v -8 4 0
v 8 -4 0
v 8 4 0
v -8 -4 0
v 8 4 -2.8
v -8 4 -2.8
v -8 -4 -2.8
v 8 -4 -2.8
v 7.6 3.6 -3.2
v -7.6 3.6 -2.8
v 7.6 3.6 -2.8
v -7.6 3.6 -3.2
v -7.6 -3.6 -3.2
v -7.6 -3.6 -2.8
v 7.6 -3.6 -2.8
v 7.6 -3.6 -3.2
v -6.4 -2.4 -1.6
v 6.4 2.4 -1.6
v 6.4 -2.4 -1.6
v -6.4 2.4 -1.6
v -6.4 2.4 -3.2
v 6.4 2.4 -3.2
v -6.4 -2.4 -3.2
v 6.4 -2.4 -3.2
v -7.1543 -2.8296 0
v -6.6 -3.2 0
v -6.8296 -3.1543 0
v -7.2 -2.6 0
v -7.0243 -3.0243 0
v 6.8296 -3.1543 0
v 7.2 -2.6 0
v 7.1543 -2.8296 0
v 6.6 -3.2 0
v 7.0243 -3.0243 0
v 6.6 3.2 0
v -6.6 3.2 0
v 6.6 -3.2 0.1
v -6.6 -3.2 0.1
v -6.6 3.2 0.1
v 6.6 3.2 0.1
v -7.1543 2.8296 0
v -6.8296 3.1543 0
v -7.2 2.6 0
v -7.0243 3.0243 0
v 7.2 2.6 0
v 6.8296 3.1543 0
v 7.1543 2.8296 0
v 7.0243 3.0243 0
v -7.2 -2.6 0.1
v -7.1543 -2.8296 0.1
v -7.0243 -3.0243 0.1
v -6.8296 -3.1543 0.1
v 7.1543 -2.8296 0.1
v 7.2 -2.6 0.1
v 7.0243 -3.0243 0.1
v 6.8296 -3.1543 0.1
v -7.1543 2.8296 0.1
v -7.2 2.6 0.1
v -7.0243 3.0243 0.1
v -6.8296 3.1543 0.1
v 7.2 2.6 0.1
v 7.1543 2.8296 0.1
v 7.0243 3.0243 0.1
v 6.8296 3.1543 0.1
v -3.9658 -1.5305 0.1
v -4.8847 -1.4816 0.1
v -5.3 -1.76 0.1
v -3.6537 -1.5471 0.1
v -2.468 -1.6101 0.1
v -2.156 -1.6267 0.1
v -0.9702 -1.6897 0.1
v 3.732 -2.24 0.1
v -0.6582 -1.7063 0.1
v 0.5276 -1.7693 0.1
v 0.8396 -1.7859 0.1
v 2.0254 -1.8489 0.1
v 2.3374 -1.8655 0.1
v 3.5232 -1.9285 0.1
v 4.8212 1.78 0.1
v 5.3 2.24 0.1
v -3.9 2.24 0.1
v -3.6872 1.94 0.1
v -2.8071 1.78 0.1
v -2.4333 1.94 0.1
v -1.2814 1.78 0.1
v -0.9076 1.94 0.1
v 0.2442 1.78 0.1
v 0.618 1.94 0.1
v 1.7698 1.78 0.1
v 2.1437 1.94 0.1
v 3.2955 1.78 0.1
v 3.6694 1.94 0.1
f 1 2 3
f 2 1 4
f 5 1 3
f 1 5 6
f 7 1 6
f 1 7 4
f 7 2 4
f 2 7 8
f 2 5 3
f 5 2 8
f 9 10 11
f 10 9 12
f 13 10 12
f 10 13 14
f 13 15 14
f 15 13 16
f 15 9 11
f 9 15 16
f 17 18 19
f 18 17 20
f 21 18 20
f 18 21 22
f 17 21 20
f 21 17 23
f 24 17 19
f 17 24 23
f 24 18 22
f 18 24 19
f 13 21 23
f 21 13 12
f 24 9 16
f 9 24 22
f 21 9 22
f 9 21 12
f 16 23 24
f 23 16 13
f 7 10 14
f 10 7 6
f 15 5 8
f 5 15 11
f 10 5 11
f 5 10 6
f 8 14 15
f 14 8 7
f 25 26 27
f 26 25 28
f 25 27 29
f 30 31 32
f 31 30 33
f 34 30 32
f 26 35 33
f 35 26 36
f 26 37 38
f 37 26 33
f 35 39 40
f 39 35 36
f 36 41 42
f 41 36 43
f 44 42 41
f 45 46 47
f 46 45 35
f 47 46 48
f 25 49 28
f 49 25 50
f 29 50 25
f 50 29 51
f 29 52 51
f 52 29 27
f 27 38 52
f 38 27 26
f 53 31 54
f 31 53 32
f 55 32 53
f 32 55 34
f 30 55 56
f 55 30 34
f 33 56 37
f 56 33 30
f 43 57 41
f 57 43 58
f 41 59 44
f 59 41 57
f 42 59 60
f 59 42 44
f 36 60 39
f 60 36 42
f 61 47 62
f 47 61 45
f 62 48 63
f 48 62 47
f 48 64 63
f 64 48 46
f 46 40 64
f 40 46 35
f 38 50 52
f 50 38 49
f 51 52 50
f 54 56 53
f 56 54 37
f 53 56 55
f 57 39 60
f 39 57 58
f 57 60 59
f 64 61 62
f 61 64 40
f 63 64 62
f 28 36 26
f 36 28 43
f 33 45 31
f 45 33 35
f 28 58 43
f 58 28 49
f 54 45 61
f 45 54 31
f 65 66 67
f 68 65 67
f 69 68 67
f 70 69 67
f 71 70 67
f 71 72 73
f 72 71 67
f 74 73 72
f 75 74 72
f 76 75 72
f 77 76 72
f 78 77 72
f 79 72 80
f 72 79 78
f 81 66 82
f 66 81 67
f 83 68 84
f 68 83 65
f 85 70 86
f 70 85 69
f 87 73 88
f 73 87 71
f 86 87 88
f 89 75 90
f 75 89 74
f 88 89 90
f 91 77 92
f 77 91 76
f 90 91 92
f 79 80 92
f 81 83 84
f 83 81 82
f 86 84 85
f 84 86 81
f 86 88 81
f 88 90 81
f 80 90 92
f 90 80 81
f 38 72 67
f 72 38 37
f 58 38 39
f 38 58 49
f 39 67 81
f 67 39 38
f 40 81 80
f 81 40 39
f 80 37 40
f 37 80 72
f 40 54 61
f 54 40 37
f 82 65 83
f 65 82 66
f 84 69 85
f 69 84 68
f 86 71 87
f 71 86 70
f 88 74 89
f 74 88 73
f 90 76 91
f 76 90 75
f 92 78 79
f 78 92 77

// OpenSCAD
// file: ../p/box3u12.scad
use <../lib.scad>
function ldraw_lib__box3u12() = [
// 0 Box with 3 Parallel Faces without Any Edges
// 0 Name: box3u12.dat
// 0 Author: J.C. Tchang [tchang]
// 0 !LDRAW_ORG Primitive UPDATE 2014-02
// 0 !LICENSE Licensed under CC BY 4.0 : see CAreadme.txt
// 
// 0 BFC CERTIFY CCW
  [0,"BFC","CERTIFY"],
  [0,"BFC","CCW"],
// 
// 0 !HISTORY 2014-12-23 [PTadmin] Official Update 2014-02
// 
// 
// 4 16 -1 1 1 1 1 1 1 1 -1 -1 1 -1
  [4,16,-1,1,1,1,1,1,1,1,-1,-1,1,-1],
// 4 16 -1 1 1 -1 0 1 1 0 1 1 1 1
  [4,16,-1,1,1,-1,0,1,1,0,1,1,1,1],
// 4 16 1 1 -1 1 0 -1 -1 0 -1 -1 1 -1
  [4,16,1,1,-1,1,0,-1,-1,0,-1,-1,1,-1],
];
module ldraw_lib__box3u12(step=0, col=false, unit=2/5, alt=false, line=0.2, solid=!$preview)
    makepoly(ldraw_lib__box3u12(), step=step, col=col, unit=unit, alt=alt, line=line, solid=solid);
ldraw_lib__box3u12(line=0.2);
// file: ../p/1-4cyli.scad
use <../lib.scad>
function ldraw_lib__1_4cyli() = [
// 0 Cylinder 0.25
// 0 Name: 1-4cyli.dat
// 0 Author: James Jessiman
// 0 !LDRAW_ORG Primitive UPDATE 2012-01
// 0 !LICENSE Licensed under CC BY 4.0 : see CAreadme.txt
// 
// 0 BFC CERTIFY CCW
  [0,"BFC","CERTIFY"],
  [0,"BFC","CCW"],
// 
// 0 !HISTORY 2002-03-23 [sbliss] Added BFC statement.
// 0 !HISTORY 2002-04-25 [PTadmin] Official Update 2002-02
// 0 !HISTORY 2007-06-22 [PTadmin] Header formatted for Contributor Agreement
// 0 !HISTORY 2008-07-01 [PTadmin] Official Update 2008-01
// 0 !HISTORY 2012-02-16 [Philo] Changed to CCW
// 0 !HISTORY 2012-03-30 [PTadmin] Official Update 2012-01
// 
// 
// 4 16 1 1 0 0.9239 1 0.3827 0.9239 0 0.3827 1 0 0
  [4,16,1,1,0,0.9239,1,0.3827,0.9239,0,0.3827,1,0,0],
// 5 24 1 0 0 1 1 0 0.9239 0 0.3827 1 0 -1
  [5,24,1,0,0,1,1,0,0.9239,0,0.3827,1,0,-1],
// 4 16 0.9239 1 0.3827 0.7071 1 0.7071 0.7071 0 0.7071 0.9239 0 0.3827
  [4,16,0.9239,1,0.3827,0.7071,1,0.7071,0.7071,0,0.7071,0.9239,0,0.3827],
// 5 24 0.9239 0 0.3827 0.9239 1 0.3827 0.7071 0 0.7071 1 0 0
  [5,24,0.9239,0,0.3827,0.9239,1,0.3827,0.7071,0,0.7071,1,0,0],
// 4 16 0.7071 1 0.7071 0.3827 1 0.9239 0.3827 0 0.9239 0.7071 0 0.7071
  [4,16,0.7071,1,0.7071,0.3827,1,0.9239,0.3827,0,0.9239,0.7071,0,0.7071],
// 5 24 0.7071 0 0.7071 0.7071 1 0.7071 0.3827 0 0.9239 0.9239 0 0.3827
  [5,24,0.7071,0,0.7071,0.7071,1,0.7071,0.3827,0,0.9239,0.9239,0,0.3827],
// 4 16 0.3827 1 0.9239 0 1 1 0 0 1 0.3827 0 0.9239
  [4,16,0.3827,1,0.9239,0,1,1,0,0,1,0.3827,0,0.9239],
// 5 24 0.3827 0 0.9239 0.3827 1 0.9239 0 0 1 0.7071 0 0.7071
  [5,24,0.3827,0,0.9239,0.3827,1,0.9239,0,0,1,0.7071,0,0.7071],
// 5 24 0 0 1 0 1 1 0.3827 0 0.9239 -1 0 1
  [5,24,0,0,1,0,1,1,0.3827,0,0.9239,-1,0,1],
];
module ldraw_lib__1_4cyli(step=0, col=false, unit=2/5, alt=false, line=0.2, solid=!$preview)
    makepoly(ldraw_lib__1_4cyli(), step=step, col=col, unit=unit, alt=alt, line=line, solid=solid);
ldraw_lib__1_4cyli(line=0.2);
// file: ../p/1-4chrd.scad
use <../lib.scad>
function ldraw_lib__1_4chrd() = [
// 0 Chord 0.25
// 0 Name: 1-4chrd.dat
// 0 Author: Max Martin Richter [MMR1988]
// 0 !LDRAW_ORG Primitive UPDATE 2023-05
// 0 !LICENSE Licensed under CC BY 4.0 : see CAreadme.txt
// 
// 0 BFC CERTIFY CCW
  [0,"BFC","CERTIFY"],
  [0,"BFC","CCW"],
// 
// 0 !HISTORY 2004-04-22 [PTadmin] Official Update 2004-02
// 0 !HISTORY 2007-10-09 [PTadmin] Header formatted for Contributor Agreement
// 0 !HISTORY 2008-07-01 [PTadmin] Official Update 2008-01
// 0 !HISTORY 2012-08-02 [MMR1988] Re-creation with PrimGen2 and Rectifier
// 0 !HISTORY 2012-08-09 [PTadmin] Official Update 2012-02
// 0 !HISTORY 2023-10-27 [OrionP] Change author to MMR1988 from hafhead
// 0 !HISTORY 2023-10-31 [OrionP] Official Update 2023-05
// 
// 4 16 0.9239 0 0.3827 0.3827 0 0.9239 0 0 1 1 0 0
  [4,16,0.9239,0,0.3827,0.3827,0,0.9239,0,0,1,1,0,0],
// 3 16 0.7071 0 0.7071 0.3827 0 0.9239 0.9239 0 0.3827
  [3,16,0.7071,0,0.7071,0.3827,0,0.9239,0.9239,0,0.3827],
];
module ldraw_lib__1_4chrd(step=0, col=false, unit=2/5, alt=false, line=0.2, solid=!$preview)
    makepoly(ldraw_lib__1_4chrd(), step=step, col=col, unit=unit, alt=alt, line=line, solid=solid);
ldraw_lib__1_4chrd(line=0.2);
// file: ../p/box5.scad
use <../lib.scad>
function ldraw_lib__box5() = [
// 0 Box with 5 Faces and All Edges
// 0 Name: box5.dat
// 0 Author: James Jessiman
// 0 !LDRAW_ORG Primitive UPDATE 2012-01
// 0 !LICENSE Licensed under CC BY 4.0 : see CAreadme.txt
// 
// 0 BFC CERTIFY CCW
  [0,"BFC","CERTIFY"],
  [0,"BFC","CCW"],
// 
// 0 !HISTORY 2002-04-03 [sbliss] Modified for BFC compliance
// 0 !HISTORY 2002-04-25 [PTadmin] Official Update 2002-02
// 0 !HISTORY 2007-06-24 [PTadmin] Header formatted for Contributor Agreement
// 0 !HISTORY 2008-07-01 [PTadmin] Official Update 2008-01
// 0 !HISTORY 2012-02-16 [Philo] Changed to CCW
// 0 !HISTORY 2012-03-30 [PTadmin] Official Update 2012-01
// 
// 
// 2 24 1 1 1 -1 1 1
  [2,24,1,1,1,-1,1,1],
// 2 24 -1 1 1 -1 1 -1
  [2,24,-1,1,1,-1,1,-1],
// 2 24 -1 1 -1 1 1 -1
  [2,24,-1,1,-1,1,1,-1],
// 2 24 1 1 -1 1 1 1
  [2,24,1,1,-1,1,1,1],
// 2 24 1 0 1 -1 0 1
  [2,24,1,0,1,-1,0,1],
// 2 24 -1 0 1 -1 0 -1
  [2,24,-1,0,1,-1,0,-1],
// 2 24 -1 0 -1 1 0 -1
  [2,24,-1,0,-1,1,0,-1],
// 2 24 1 0 -1 1 0 1
  [2,24,1,0,-1,1,0,1],
// 2 24 1 0 1 1 1 1
  [2,24,1,0,1,1,1,1],
// 2 24 -1 0 1 -1 1 1
  [2,24,-1,0,1,-1,1,1],
// 2 24 1 0 -1 1 1 -1
  [2,24,1,0,-1,1,1,-1],
// 2 24 -1 0 -1 -1 1 -1
  [2,24,-1,0,-1,-1,1,-1],
// 4 16 -1 1 1 1 1 1 1 1 -1 -1 1 -1
  [4,16,-1,1,1,1,1,1,1,1,-1,-1,1,-1],
// 4 16 -1 1 1 -1 0 1 1 0 1 1 1 1
  [4,16,-1,1,1,-1,0,1,1,0,1,1,1,1],
// 4 16 -1 1 -1 -1 0 -1 -1 0 1 -1 1 1
  [4,16,-1,1,-1,-1,0,-1,-1,0,1,-1,1,1],
// 4 16 1 1 -1 1 0 -1 -1 0 -1 -1 1 -1
  [4,16,1,1,-1,1,0,-1,-1,0,-1,-1,1,-1],
// 4 16 1 1 1 1 0 1 1 0 -1 1 1 -1
  [4,16,1,1,1,1,0,1,1,0,-1,1,1,-1],
];
module ldraw_lib__box5(step=0, col=false, unit=2/5, alt=false, line=0.2, solid=!$preview)
    makepoly(ldraw_lib__box5(), step=step, col=col, unit=unit, alt=alt, line=line, solid=solid);
ldraw_lib__box5(line=0.2);
// file: ../p/box4.scad
use <../lib.scad>
function ldraw_lib__box4() = [
// 0 Box with 4 Faces (2 Parallel Pairs) and All Edges
// 0 Name: box4.dat
// 0 Author: James Jessiman
// 0 !LDRAW_ORG Primitive UPDATE 2012-01
// 0 !LICENSE Licensed under CC BY 4.0 : see CAreadme.txt
// 
// 0 BFC CERTIFY CCW
  [0,"BFC","CERTIFY"],
  [0,"BFC","CCW"],
// 
// 0 !HISTORY 2002-04-03 [sbliss] Modified for BFC compliance
// 0 !HISTORY 2002-04-25 [PTadmin] Official Update 2002-02
// 0 !HISTORY 2007-06-24 [PTadmin] Header formatted for Contributor Agreement
// 0 !HISTORY 2008-07-01 [PTadmin] Official Update 2008-01
// 0 !HISTORY 2012-02-16 [Philo] Changed to CCW
// 0 !HISTORY 2012-03-30 [PTadmin] Official Update 2012-01
// 
// 
// 2 24 1 1 1 -1 1 1
  [2,24,1,1,1,-1,1,1],
// 2 24 -1 1 1 -1 1 -1
  [2,24,-1,1,1,-1,1,-1],
// 2 24 -1 1 -1 1 1 -1
  [2,24,-1,1,-1,1,1,-1],
// 2 24 1 1 -1 1 1 1
  [2,24,1,1,-1,1,1,1],
// 2 24 1 0 1 -1 0 1
  [2,24,1,0,1,-1,0,1],
// 2 24 -1 0 1 -1 0 -1
  [2,24,-1,0,1,-1,0,-1],
// 2 24 -1 0 -1 1 0 -1
  [2,24,-1,0,-1,1,0,-1],
// 2 24 1 0 -1 1 0 1
  [2,24,1,0,-1,1,0,1],
// 2 24 1 0 1 1 1 1
  [2,24,1,0,1,1,1,1],
// 2 24 -1 0 1 -1 1 1
  [2,24,-1,0,1,-1,1,1],
// 2 24 1 0 -1 1 1 -1
  [2,24,1,0,-1,1,1,-1],
// 2 24 -1 0 -1 -1 1 -1
  [2,24,-1,0,-1,-1,1,-1],
// 4 16 -1 1 1 -1 0 1 1 0 1 1 1 1
  [4,16,-1,1,1,-1,0,1,1,0,1,1,1,1],
// 4 16 -1 1 -1 -1 0 -1 -1 0 1 -1 1 1
  [4,16,-1,1,-1,-1,0,-1,-1,0,1,-1,1,1],
// 4 16 1 1 -1 1 0 -1 -1 0 -1 -1 1 -1
  [4,16,1,1,-1,1,0,-1,-1,0,-1,-1,1,-1],
// 4 16 1 1 1 1 0 1 1 0 -1 1 1 -1
  [4,16,1,1,1,1,0,1,1,0,-1,1,1,-1],
];
module ldraw_lib__box4(step=0, col=false, unit=2/5, alt=false, line=0.2, solid=!$preview)
    makepoly(ldraw_lib__box4(), step=step, col=col, unit=unit, alt=alt, line=line, solid=solid);
ldraw_lib__box4(line=0.2);
// file: s/3069bs01.scad
use <../../lib.scad>
use <../../p/box4.scad>
use <../../p/box5.scad>
function ldraw_lib__s__3069bs01() = [
// 0 ~Tile  1 x  2 with Groove without Top Face
// 0 Name: s\3069bs01.dat
// 0 Author: Santeri Piippo [arezey]
// 0 !LDRAW_ORG Subpart UPDATE 2010-02
// 0 !LICENSE Licensed under CC BY 4.0 : see CAreadme.txt
// 
// 0 BFC CERTIFY CCW
  [0,"BFC","CERTIFY"],
  [0,"BFC","CCW"],
// 
// 0 !HISTORY 2010-07-05 [PTadmin] Official Update 2010-02
// 
// 
// 1 16 0 0 0 20 0 0 0 7 0 0 0 10 box4.dat
  [1,16,0,0,0,20,0,0,0,7,0,0,0,10, ldraw_lib__box4()],
// 1 16 0 7 0 19 0 0 0 1 0 0 0 9 box4.dat
  [1,16,0,7,0,19,0,0,0,1,0,0,0,9, ldraw_lib__box4()],
// 0 BFC INVERTNEXT
  [0,"BFC","INVERTNEXT"],
// 1 16 0 8 0 16 0 0 0 -4 0 0 0 6 box5.dat
  [1,16,0,8,0,16,0,0,0,-4,0,0,0,6, ldraw_lib__box5()],
// 4 16 -19 8 9 -16 8 6 -16 8 -6 -19 8 -9
  [4,16,-19,8,9,-16,8,6,-16,8,-6,-19,8,-9],
// 4 16 19 8 -9 16 8 -6 16 8 6 19 8 9
  [4,16,19,8,-9,16,8,-6,16,8,6,19,8,9],
// 4 16 19 8 9 16 8 6 -16 8 6 -19 8 9
  [4,16,19,8,9,16,8,6,-16,8,6,-19,8,9],
// 4 16 -19 8 -9 -16 8 -6 16 8 -6 19 8 -9
  [4,16,-19,8,-9,-16,8,-6,16,8,-6,19,8,-9],
// 4 16 -20 7 10 -19 7 9 -19 7 -9 -20 7 -10
  [4,16,-20,7,10,-19,7,9,-19,7,-9,-20,7,-10],
// 4 16 20 7 -10 19 7 -9 19 7 9 20 7 10
  [4,16,20,7,-10,19,7,-9,19,7,9,20,7,10],
// 4 16 20 7 10 19 7 9 -19 7 9 -20 7 10
  [4,16,20,7,10,19,7,9,-19,7,9,-20,7,10],
// 4 16 -20 7 -10 -19 7 -9 19 7 -9 20 7 -10
  [4,16,-20,7,-10,-19,7,-9,19,7,-9,20,7,-10],
// 0 //
];
module ldraw_lib__s__3069bs01(step=0, col=false, unit=2/5, alt=false, line=0.2, solid=!$preview)
    makepoly(ldraw_lib__s__3069bs01(), step=step, col=col, unit=unit, alt=alt, line=line, solid=solid);
ldraw_lib__s__3069bs01(line=0.2);
// file: 6142271n.scad
use <../lib.scad>
use <6142271m.scad>
function ldraw_lib__6142271n() = [
// 0 Sticker  0.8 x  1.8 with Black Air Vents on White Background Left
// 0 Name: 6142271n.dat
// 0 Author: Massimo Maso [Sirio]
// 0 !LDRAW_ORG Part UPDATE 2025-03
// 0 !LICENSE Licensed under CC BY 4.0 : see CAreadme.txt
// 
// 0 BFC CERTIFY CCW
  [0,"BFC","CERTIFY"],
  [0,"BFC","CCW"],
// 
// 0 !KEYWORDS Audi, Bricklink 75873stk01a, Brickowl 427960, LMS, R8
// 0 !KEYWORDS Rebrickable 24755, Set 75873, Speed Champions, Ultra
// 
// 0 !HISTORY 2025-03-30 [OrionP] Official Update 2025-03
// 
// 
// 1 16 0 0 0 1 0 0 0 1 0 0 0 -1 6142271m.dat
  [1,16,0,0,0,1,0,0,0,1,0,0,0,-1, ldraw_lib__6142271m()],
];
module ldraw_lib__6142271n(step=0, col=false, unit=2/5, alt=false, line=0.2, solid=!$preview)
    makepoly(ldraw_lib__6142271n(), step=step, col=col, unit=unit, alt=alt, line=line, solid=solid);
ldraw_lib__6142271n(line=0.2);
// file: 3069b.scad
use <../lib.scad>
use <s/3069bs01.scad>
function ldraw_lib__3069b() = [
// 0 Tile  1 x  2 with Groove
// 0 Name: 3069b.dat
// 0 Author: Santeri Piippo [arezey]
// 0 !LDRAW_ORG Part UPDATE 2010-02
// 0 !LICENSE Licensed under CC BY 4.0 : see CAreadme.txt
// 
// 0 BFC CERTIFY CCW
  [0,"BFC","CERTIFY"],
  [0,"BFC","CCW"],
// 
// 0 !HISTORY 2010-07-05 [PTadmin] Official Update 2010-02
// 
// 
// 4 16 20 0 -10 20 0 10 -20 0 10 -20 0 -10
  [4,16,20,0,-10,20,0,10,-20,0,10,-20,0,-10],
// 1 16 0 0 0 1 0 0 0 1 0 0 0 1 s\3069bs01.dat
  [1,16,0,0,0,1,0,0,0,1,0,0,0,1, ldraw_lib__s__3069bs01()],
// 0 //
];
module ldraw_lib__3069b(step=0, col=false, unit=2/5, alt=false, line=0.2, solid=!$preview)
    makepoly(ldraw_lib__3069b(), step=step, col=col, unit=unit, alt=alt, line=line, solid=solid);
ldraw_lib__3069b(line=0.2);
// main file
use <../lib.scad>
use <3069b.scad>
use <6142271n.scad>
function ldraw_lib__3069bd1i() = [
// 0 Tile  1 x  2 with Black Air Vents on White Background Left Sticker
// 0 Name: 3069bd1i.dat
// 0 Author: Vincent Messenet [Cheenzo]
// 0 !LDRAW_ORG Shortcut UPDATE 2025-03
// 0 !LICENSE Licensed under CC BY 4.0 : see CAreadme.txt
// 
// 0 BFC CERTIFY CCW
  [0,"BFC","CERTIFY"],
  [0,"BFC","CCW"],
// 
// 0 !CATEGORY Sticker Shortcut
// 0 !KEYWORDS Audi R8 LMS ultra, Bricklink 3069pb0971L, Set 75873
// 
// 0 !HISTORY 2025-03-30 [OrionP] Official Update 2025-03
// 
// 1 16 0 0 0 1 0 0 0 1 0 0 0 1 3069b.dat
  [1,16,0,0,0,1,0,0,0,1,0,0,0,1, ldraw_lib__3069b()],
// 1 16 0 0 0 1 0 0 0 1 0 0 0 1 6142271n.dat
  [1,16,0,0,0,1,0,0,0,1,0,0,0,1, ldraw_lib__6142271n()],
];
module ldraw_lib__3069bd1i(step=0, col=false, unit=2/5, alt=false, line=0.2, solid=!$preview)
    makepoly(ldraw_lib__3069bd1i(), step=step, col=col, unit=unit, alt=alt, line=line, solid=solid);
ldraw_lib__3069bd1i(line=0.2);
